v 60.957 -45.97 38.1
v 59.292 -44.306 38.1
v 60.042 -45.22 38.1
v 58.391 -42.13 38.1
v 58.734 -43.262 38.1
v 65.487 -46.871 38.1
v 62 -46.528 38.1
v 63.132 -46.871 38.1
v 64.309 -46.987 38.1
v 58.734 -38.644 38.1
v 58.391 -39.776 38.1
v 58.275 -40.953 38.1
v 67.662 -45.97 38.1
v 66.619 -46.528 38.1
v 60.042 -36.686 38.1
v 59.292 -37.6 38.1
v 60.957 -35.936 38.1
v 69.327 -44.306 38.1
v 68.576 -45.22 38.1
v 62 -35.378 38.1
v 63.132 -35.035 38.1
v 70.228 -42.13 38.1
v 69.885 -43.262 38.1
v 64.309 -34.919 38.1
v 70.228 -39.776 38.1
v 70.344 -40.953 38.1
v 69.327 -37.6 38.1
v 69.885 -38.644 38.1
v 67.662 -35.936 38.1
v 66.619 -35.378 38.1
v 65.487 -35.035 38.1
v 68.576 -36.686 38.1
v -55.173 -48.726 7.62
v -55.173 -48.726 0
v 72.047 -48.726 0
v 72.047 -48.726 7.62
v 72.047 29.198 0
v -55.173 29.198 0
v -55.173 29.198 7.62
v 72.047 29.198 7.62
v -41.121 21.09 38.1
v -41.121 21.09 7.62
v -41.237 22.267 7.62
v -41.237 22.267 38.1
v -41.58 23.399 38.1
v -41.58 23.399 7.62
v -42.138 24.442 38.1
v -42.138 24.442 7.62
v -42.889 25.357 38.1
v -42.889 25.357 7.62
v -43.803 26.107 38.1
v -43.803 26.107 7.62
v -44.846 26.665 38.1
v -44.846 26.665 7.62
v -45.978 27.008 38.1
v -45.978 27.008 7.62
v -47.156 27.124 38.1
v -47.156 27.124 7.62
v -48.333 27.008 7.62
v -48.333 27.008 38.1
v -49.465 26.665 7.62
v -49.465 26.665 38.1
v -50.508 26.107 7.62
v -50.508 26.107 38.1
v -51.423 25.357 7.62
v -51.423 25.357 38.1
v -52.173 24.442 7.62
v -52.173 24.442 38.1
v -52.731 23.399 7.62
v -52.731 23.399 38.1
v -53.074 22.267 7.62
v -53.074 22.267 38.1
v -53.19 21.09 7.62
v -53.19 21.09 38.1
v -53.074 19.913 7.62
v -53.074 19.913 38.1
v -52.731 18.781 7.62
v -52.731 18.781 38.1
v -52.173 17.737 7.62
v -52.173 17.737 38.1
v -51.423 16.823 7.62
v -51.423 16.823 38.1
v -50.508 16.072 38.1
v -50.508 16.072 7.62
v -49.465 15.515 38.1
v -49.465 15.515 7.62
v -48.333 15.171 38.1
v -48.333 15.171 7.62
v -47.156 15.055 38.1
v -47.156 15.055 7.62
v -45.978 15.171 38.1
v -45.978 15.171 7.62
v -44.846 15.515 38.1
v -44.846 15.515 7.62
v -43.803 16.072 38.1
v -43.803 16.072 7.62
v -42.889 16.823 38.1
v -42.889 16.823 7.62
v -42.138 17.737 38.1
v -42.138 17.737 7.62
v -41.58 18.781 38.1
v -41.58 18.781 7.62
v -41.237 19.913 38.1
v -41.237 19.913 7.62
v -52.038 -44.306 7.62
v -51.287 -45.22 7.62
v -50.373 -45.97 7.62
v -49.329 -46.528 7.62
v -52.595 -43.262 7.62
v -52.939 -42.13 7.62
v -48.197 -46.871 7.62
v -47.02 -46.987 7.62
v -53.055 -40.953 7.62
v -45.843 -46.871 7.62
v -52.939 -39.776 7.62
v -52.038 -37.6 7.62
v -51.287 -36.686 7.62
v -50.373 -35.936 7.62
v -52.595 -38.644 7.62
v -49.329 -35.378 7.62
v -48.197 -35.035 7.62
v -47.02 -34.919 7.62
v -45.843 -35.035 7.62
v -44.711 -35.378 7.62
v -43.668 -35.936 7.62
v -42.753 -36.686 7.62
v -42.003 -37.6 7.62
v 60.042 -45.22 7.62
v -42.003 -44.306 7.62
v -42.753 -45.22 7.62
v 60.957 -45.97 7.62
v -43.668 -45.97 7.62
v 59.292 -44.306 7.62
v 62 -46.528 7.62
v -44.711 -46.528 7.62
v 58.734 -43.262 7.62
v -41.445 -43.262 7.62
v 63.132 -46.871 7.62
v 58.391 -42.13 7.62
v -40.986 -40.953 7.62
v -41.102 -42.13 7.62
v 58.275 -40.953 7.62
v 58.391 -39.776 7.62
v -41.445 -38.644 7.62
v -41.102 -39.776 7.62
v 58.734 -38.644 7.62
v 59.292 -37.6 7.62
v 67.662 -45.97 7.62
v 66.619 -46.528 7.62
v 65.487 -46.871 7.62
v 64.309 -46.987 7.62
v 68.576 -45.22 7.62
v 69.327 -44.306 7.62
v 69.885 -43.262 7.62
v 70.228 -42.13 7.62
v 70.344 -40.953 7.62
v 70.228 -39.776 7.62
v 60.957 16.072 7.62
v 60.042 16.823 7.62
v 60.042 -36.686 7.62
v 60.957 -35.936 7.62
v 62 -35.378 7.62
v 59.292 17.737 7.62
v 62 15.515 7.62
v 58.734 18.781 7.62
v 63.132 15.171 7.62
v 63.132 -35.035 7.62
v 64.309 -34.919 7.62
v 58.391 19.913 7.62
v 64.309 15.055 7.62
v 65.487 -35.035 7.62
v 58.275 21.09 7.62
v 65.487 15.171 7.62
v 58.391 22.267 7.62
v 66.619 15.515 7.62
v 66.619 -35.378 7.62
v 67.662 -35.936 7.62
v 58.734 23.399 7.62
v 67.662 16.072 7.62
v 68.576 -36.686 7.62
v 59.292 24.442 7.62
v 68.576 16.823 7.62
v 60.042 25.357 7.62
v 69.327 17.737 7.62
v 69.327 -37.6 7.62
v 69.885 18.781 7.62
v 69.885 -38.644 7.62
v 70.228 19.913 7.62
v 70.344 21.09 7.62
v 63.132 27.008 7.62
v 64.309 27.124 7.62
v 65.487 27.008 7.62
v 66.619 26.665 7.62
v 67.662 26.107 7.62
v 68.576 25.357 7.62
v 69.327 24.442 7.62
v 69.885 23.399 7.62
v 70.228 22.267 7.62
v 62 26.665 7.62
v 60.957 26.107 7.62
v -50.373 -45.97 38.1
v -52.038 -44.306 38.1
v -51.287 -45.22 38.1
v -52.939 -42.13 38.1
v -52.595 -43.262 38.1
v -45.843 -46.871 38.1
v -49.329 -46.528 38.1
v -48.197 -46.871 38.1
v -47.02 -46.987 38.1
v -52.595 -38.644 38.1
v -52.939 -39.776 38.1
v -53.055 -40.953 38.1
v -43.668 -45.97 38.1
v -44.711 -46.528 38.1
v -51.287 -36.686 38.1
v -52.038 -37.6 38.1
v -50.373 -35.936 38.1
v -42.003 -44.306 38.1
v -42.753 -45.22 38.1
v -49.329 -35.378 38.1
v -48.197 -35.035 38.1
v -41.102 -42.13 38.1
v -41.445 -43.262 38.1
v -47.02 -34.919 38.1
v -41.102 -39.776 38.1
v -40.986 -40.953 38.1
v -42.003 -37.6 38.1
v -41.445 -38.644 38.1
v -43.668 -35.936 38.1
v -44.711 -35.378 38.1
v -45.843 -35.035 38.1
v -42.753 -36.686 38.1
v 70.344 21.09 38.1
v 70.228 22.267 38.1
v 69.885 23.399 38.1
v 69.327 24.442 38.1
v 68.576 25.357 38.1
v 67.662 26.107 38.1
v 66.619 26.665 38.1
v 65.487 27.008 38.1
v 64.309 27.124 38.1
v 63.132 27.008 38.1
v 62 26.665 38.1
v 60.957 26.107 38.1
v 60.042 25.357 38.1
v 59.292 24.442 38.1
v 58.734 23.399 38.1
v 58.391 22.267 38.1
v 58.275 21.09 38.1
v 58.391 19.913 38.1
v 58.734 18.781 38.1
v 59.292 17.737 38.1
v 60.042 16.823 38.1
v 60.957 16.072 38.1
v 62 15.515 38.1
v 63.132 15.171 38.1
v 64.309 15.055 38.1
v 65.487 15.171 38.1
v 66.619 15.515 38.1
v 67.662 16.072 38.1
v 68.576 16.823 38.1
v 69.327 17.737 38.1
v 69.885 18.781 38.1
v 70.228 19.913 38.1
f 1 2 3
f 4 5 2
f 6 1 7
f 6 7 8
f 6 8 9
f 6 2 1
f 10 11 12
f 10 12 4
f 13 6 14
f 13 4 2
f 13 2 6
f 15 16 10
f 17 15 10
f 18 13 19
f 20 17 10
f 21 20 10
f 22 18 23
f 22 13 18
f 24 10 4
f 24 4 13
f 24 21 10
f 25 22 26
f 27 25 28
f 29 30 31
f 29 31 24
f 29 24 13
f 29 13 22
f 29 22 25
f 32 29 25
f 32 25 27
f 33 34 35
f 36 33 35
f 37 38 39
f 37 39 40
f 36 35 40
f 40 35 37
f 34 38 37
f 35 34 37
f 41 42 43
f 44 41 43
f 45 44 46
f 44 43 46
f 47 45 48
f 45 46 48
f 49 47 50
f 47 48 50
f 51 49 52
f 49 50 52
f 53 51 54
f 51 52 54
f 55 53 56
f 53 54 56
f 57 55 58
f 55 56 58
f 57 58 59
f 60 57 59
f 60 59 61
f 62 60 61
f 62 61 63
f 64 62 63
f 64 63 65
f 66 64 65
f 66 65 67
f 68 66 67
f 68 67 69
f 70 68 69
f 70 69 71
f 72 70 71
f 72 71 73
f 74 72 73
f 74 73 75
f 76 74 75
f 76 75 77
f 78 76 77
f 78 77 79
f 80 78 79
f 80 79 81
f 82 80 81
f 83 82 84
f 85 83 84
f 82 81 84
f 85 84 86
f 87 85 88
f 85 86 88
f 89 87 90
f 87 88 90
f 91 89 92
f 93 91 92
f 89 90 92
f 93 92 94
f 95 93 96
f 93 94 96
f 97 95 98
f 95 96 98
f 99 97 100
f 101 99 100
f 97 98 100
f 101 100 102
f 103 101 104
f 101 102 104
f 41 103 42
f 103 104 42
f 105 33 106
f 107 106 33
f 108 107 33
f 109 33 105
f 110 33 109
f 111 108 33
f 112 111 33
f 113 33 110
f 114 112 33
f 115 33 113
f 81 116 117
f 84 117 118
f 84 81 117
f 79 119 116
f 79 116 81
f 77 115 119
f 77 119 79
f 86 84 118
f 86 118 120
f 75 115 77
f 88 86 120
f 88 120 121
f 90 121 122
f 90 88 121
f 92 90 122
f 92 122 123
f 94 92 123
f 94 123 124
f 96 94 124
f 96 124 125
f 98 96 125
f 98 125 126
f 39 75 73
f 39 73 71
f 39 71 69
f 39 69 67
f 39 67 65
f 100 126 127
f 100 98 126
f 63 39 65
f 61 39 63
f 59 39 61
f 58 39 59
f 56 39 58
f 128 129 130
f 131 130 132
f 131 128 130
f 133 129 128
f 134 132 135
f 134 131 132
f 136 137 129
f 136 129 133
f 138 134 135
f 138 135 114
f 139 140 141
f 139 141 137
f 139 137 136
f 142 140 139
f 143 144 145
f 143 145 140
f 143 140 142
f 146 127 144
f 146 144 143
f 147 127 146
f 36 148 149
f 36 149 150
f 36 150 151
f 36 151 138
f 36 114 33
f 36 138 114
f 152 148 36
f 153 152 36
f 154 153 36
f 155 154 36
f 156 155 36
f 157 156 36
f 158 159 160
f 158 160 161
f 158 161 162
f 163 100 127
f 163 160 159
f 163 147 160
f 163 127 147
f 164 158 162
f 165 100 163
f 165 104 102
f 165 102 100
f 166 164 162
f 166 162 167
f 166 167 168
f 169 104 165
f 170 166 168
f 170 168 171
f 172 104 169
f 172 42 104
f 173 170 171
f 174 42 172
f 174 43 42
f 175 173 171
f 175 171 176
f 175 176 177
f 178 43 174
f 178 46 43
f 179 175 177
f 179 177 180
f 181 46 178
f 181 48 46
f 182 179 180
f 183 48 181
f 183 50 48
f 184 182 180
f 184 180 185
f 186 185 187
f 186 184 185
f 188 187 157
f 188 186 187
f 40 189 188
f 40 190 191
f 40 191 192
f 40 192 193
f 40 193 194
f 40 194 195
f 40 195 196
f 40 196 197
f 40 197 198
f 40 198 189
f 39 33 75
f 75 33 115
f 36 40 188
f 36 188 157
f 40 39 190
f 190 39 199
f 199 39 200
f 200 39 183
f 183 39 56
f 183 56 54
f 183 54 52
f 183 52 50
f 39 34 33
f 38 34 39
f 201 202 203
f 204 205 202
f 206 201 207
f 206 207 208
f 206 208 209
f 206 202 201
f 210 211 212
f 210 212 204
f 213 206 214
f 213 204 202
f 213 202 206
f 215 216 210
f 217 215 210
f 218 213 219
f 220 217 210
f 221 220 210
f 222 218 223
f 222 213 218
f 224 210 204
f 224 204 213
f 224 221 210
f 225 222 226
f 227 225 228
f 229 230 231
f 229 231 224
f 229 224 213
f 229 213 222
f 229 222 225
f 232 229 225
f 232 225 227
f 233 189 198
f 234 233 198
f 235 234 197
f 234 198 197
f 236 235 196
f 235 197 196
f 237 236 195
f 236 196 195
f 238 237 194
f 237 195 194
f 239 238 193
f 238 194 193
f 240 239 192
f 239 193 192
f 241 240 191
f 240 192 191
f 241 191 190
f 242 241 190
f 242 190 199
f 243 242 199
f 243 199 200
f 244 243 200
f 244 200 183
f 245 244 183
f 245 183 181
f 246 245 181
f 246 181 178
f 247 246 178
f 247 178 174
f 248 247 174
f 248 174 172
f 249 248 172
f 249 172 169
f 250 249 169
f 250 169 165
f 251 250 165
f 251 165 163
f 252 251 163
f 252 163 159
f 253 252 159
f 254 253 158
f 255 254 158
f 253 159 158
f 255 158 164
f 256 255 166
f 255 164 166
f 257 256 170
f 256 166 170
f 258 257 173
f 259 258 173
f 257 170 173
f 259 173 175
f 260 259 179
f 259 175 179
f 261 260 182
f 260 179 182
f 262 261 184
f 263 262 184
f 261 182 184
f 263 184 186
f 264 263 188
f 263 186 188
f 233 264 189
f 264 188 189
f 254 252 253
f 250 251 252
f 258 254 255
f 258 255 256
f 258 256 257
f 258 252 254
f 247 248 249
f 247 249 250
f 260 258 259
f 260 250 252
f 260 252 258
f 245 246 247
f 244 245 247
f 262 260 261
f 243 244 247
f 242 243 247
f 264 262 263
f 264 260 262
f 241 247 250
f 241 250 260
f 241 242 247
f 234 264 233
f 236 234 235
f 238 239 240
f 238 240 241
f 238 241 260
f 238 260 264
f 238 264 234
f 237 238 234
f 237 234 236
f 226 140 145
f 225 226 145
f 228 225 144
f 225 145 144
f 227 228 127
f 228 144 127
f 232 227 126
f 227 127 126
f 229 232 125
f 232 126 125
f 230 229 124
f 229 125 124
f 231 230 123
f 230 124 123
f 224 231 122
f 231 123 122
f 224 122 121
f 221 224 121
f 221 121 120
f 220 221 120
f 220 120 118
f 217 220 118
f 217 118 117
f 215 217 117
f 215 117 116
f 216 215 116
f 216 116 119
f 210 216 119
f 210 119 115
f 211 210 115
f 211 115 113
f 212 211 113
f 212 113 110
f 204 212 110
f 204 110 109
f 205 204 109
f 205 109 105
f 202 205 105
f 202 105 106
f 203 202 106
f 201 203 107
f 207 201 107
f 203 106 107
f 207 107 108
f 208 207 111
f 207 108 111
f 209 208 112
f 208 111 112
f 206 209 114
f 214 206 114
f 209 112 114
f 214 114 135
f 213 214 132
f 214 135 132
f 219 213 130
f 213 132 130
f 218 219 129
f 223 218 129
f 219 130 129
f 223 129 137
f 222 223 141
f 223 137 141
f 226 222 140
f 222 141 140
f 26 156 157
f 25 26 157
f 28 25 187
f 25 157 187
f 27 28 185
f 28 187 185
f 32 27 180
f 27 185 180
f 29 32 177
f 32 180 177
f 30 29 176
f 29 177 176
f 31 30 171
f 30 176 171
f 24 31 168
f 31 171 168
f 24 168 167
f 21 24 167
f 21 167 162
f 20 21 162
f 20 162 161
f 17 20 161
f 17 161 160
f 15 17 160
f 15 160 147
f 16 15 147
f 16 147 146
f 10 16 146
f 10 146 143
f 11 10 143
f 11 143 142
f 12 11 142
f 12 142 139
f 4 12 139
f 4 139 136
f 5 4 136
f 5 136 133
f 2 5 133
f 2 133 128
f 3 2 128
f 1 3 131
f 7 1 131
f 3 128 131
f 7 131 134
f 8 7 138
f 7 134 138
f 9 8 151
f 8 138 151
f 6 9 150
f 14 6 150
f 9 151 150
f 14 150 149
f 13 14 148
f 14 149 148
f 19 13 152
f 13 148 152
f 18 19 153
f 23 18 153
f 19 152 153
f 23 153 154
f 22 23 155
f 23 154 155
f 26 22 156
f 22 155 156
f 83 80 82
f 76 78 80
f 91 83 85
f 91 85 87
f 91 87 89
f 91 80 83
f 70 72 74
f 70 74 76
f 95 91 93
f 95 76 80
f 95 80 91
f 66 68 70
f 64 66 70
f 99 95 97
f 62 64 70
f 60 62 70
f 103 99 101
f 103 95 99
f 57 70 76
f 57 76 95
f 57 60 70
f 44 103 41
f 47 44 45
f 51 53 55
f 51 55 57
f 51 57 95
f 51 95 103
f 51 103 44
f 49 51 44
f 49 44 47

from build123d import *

# Parameters (mm, degrees)
F0_W     = 127.219696
F0_H     = 77.92443
F1_DEPTH = 7.62
F2_R     = 6.034431
F3_DEPTH = 38.1


with BuildPart() as f1:
    # F0 (on Top) → F1 (new body)
    with BuildSketch(Plane.XY):
        with Locations((8.437073, -9.764254)):
            Rectangle(F0_W, F0_H)
    extrude(amount=F1_DEPTH)

    # F2 (on Top) → F3 (join)
    with BuildSketch(Plane.XY):
        with Locations((-47.020096, -40.952984)):
            Circle(F2_R)
        with Locations((-47.155522, 21.089828)):
            Circle(F2_R)
        with Locations((64.309441, -40.952984)):
            Circle(F2_R)
        with Locations((64.309441, 21.089828)):
            Circle(F2_R)
    extrude(amount=F3_DEPTH)


solid = f1.part
